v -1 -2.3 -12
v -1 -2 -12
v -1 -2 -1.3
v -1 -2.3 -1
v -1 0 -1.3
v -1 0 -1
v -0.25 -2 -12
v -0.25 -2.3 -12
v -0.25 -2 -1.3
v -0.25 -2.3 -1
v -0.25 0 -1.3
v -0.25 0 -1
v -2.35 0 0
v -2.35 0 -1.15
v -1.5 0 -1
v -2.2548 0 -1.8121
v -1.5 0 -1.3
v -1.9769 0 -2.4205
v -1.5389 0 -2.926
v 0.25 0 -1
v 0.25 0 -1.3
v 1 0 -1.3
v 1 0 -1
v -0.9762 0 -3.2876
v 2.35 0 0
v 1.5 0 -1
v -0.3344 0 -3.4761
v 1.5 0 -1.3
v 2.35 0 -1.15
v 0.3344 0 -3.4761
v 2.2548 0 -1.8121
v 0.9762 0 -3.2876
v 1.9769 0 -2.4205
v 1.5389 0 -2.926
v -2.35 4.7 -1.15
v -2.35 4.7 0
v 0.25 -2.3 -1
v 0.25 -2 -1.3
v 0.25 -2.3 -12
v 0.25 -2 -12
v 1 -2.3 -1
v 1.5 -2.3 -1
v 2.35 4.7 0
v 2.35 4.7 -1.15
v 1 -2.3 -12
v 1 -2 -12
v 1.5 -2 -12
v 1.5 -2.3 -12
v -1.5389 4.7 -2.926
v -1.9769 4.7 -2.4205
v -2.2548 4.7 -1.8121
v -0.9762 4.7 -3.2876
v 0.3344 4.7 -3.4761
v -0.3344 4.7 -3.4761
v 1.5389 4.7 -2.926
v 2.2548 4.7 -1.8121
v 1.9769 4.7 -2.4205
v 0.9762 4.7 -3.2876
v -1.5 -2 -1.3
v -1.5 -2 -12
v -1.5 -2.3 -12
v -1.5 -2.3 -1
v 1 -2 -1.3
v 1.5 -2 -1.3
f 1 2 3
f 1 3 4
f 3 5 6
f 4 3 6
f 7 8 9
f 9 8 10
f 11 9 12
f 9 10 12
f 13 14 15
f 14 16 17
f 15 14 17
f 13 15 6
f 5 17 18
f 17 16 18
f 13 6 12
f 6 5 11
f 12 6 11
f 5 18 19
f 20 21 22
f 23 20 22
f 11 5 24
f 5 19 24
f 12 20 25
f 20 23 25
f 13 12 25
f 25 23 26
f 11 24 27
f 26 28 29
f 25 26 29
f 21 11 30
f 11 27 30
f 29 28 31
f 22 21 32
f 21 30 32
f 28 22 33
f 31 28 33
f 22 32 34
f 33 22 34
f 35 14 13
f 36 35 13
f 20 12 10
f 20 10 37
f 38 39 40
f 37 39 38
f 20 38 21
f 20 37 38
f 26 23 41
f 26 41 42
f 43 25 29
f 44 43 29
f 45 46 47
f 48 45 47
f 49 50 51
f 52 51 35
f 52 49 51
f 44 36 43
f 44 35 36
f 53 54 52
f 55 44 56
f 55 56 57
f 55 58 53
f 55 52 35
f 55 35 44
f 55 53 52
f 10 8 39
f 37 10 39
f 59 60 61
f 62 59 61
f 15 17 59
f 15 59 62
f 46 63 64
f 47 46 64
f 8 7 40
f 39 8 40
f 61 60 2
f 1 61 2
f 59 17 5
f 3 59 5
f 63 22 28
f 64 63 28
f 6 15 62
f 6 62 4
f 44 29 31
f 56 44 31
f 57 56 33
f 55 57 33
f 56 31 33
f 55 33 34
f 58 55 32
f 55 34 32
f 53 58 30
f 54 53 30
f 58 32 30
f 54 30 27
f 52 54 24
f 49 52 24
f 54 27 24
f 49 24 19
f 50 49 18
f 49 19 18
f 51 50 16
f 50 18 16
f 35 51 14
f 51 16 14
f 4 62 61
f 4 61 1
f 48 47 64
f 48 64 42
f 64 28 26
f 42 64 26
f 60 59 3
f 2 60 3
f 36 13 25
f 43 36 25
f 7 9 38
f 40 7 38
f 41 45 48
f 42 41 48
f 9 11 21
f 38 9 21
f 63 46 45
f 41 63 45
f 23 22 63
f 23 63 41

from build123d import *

# Parameters (mm, degrees)
EXTRUDE_1_DEPTH = 4.7
SKETCH_2_W      = 0.5
SKETCH_2_H      = 0.3
EXTRUDE_2_DEPTH = 2
SKETCH_3_W      = 0.5
SKETCH_3_H      = 0.3
EXTRUDE_3_DEPTH = 11


with BuildPart() as part:
    # 草图1 → 凸台-拉伸1 (new body)
    with BuildSketch(Plane(origin=(0, 0, 0), x_dir=(1, 0, 0), z_dir=(0, 1, 0))):
        with BuildLine():
            Line((-2.35, 0), (2.35, 0))
            Line((2.35, 0), (2.35, 1.15))
            ThreePointArc((2.35, 1.15), (0, 3.5), (-2.35, 1.15))
            Line((-2.35, 1.15), (-2.35, 0))
        make_face()
    extrude(amount=EXTRUDE_1_DEPTH)

    # 草图2 → 凸台-拉伸2 (add)
    with BuildSketch(Plane.XZ):
        with Locations((1.25, -1.15)):
            Rectangle(SKETCH_2_W, SKETCH_2_H)
        with Locations((0, -1.15)):
            Rectangle(SKETCH_2_W, SKETCH_2_H)
        with Locations((-1.25, -1.15)):
            Rectangle(SKETCH_2_W, SKETCH_2_H)
    extrude(amount=EXTRUDE_2_DEPTH)

    # 草图3 → 凸台-拉伸3 (add)
    with BuildSketch(Plane.XY.offset(-1)):
        with Locations((0, -2.15)):
            Rectangle(SKETCH_3_W, SKETCH_3_H)
        with Locations((-1.25, -2.15)):
            Rectangle(SKETCH_3_W, SKETCH_3_H)
        with Locations((1.25, -2.15)):
            Rectangle(SKETCH_3_W, SKETCH_3_H)
    extrude(amount=-EXTRUDE_3_DEPTH)


solid = part.part
